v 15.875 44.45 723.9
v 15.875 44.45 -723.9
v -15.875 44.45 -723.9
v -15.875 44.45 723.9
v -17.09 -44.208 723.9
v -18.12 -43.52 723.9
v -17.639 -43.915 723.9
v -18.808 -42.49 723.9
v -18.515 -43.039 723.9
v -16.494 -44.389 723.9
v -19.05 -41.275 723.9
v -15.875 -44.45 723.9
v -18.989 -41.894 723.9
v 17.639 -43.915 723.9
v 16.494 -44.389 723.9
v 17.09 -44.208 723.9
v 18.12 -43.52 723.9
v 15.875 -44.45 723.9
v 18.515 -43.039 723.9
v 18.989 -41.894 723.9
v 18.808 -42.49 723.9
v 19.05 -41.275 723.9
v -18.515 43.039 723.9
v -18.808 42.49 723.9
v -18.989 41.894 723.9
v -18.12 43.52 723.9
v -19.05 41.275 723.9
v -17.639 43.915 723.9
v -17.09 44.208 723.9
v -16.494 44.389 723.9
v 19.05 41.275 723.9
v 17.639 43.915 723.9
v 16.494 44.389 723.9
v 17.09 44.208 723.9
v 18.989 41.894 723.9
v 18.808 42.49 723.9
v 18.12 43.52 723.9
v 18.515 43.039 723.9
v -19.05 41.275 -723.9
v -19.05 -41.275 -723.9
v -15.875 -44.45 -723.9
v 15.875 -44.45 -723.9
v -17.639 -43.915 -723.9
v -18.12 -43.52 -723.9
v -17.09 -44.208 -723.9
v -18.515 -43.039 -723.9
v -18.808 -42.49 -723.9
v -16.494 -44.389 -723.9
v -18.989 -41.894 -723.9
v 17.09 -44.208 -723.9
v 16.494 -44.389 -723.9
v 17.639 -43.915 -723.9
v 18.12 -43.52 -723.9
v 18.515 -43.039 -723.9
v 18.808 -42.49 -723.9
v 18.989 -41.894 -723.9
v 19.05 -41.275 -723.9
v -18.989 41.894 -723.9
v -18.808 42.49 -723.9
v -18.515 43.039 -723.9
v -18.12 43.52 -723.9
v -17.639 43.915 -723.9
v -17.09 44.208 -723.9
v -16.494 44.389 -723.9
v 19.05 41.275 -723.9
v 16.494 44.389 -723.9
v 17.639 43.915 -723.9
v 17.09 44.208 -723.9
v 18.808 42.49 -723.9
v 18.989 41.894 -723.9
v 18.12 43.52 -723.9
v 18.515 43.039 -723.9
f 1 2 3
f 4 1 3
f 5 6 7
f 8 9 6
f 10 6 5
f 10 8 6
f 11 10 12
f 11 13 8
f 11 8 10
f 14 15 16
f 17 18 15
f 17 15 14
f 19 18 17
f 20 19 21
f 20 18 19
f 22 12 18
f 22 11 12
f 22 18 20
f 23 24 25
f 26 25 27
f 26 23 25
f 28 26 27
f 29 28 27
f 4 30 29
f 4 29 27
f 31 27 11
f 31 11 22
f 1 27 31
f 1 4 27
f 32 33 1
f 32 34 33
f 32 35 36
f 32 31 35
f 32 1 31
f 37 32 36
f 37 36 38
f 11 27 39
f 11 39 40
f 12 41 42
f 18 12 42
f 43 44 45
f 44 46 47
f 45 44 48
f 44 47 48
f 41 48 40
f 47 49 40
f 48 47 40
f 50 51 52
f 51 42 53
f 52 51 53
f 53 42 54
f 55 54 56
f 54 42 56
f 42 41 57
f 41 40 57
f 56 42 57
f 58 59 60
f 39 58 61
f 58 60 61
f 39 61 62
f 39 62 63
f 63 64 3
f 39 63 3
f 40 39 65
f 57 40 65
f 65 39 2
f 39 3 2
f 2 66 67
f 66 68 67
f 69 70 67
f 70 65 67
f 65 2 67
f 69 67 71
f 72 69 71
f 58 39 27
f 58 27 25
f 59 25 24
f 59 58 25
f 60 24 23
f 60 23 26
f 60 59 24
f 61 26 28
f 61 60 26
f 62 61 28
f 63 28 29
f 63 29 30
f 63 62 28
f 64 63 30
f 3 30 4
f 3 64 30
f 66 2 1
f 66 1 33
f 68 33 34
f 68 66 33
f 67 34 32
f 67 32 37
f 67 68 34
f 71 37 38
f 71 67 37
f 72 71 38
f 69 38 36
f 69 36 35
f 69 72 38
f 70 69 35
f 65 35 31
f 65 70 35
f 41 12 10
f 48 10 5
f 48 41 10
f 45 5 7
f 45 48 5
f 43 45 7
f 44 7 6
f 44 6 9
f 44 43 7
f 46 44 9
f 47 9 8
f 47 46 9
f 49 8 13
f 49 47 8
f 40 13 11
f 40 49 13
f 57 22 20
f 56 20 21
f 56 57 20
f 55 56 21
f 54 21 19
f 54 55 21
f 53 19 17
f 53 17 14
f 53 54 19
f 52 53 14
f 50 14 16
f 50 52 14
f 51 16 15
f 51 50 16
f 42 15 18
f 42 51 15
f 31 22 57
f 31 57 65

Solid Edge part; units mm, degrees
sketch "Sketch1" plane through (0, 0, 0) normal (0, 0, 1) x (1, 0, 0)
  line L0 (-15.875, -44.45) -> (15.875, -44.45)
  arc A0 (19.05, -41.275) -> (15.875, -44.45) centre (15.875, -41.275) cw
  line L1 (19.05, -41.275) -> (19.05, 41.275)
  arc A1 (15.875, 44.45) -> (19.05, 41.275) centre (15.875, 41.275) cw
  line L2 (15.875, 44.45) -> (-15.875, 44.45)
  arc A2 (-19.05, 41.275) -> (-15.875, 44.45) centre (-15.875, 41.275) cw
  line L3 (-19.05, 41.275) -> (-19.05, -41.275)
  arc A3 (-15.875, -44.45) -> (-19.05, -41.275) centre (-15.875, -41.275) cw
  dimension "D1" = 88.9
  dimension "D2" = 38.1
  dimension "D3" = 3.175
extrude "Protrusion1" add sketch "Sketch1" along normal mid plane 1447.8
properties material "Wood, Mahogany"
